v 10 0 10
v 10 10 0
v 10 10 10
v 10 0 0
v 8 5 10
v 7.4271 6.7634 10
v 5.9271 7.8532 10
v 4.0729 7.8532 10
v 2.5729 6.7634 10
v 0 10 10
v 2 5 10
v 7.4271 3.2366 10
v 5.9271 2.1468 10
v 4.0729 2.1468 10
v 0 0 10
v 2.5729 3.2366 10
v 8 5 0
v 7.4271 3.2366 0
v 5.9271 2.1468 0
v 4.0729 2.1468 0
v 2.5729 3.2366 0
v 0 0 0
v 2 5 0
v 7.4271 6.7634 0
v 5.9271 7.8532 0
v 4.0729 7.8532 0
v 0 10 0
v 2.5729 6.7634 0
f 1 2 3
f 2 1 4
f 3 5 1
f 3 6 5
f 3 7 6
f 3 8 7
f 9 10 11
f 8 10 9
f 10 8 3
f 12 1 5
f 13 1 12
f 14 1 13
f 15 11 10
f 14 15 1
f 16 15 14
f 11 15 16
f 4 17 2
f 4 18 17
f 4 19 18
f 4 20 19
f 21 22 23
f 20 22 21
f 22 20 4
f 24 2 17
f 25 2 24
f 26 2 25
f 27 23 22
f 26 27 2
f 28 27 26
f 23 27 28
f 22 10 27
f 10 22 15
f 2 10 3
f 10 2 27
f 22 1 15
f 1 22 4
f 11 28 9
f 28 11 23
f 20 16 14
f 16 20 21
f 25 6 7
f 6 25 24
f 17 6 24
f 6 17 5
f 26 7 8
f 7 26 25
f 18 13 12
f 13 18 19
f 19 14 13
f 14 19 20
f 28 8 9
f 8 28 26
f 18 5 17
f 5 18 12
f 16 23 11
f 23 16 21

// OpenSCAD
difference() { color("red") cube(10); color("blue") translate([5,5,-1]) cylinder(h=12, r=3); }
